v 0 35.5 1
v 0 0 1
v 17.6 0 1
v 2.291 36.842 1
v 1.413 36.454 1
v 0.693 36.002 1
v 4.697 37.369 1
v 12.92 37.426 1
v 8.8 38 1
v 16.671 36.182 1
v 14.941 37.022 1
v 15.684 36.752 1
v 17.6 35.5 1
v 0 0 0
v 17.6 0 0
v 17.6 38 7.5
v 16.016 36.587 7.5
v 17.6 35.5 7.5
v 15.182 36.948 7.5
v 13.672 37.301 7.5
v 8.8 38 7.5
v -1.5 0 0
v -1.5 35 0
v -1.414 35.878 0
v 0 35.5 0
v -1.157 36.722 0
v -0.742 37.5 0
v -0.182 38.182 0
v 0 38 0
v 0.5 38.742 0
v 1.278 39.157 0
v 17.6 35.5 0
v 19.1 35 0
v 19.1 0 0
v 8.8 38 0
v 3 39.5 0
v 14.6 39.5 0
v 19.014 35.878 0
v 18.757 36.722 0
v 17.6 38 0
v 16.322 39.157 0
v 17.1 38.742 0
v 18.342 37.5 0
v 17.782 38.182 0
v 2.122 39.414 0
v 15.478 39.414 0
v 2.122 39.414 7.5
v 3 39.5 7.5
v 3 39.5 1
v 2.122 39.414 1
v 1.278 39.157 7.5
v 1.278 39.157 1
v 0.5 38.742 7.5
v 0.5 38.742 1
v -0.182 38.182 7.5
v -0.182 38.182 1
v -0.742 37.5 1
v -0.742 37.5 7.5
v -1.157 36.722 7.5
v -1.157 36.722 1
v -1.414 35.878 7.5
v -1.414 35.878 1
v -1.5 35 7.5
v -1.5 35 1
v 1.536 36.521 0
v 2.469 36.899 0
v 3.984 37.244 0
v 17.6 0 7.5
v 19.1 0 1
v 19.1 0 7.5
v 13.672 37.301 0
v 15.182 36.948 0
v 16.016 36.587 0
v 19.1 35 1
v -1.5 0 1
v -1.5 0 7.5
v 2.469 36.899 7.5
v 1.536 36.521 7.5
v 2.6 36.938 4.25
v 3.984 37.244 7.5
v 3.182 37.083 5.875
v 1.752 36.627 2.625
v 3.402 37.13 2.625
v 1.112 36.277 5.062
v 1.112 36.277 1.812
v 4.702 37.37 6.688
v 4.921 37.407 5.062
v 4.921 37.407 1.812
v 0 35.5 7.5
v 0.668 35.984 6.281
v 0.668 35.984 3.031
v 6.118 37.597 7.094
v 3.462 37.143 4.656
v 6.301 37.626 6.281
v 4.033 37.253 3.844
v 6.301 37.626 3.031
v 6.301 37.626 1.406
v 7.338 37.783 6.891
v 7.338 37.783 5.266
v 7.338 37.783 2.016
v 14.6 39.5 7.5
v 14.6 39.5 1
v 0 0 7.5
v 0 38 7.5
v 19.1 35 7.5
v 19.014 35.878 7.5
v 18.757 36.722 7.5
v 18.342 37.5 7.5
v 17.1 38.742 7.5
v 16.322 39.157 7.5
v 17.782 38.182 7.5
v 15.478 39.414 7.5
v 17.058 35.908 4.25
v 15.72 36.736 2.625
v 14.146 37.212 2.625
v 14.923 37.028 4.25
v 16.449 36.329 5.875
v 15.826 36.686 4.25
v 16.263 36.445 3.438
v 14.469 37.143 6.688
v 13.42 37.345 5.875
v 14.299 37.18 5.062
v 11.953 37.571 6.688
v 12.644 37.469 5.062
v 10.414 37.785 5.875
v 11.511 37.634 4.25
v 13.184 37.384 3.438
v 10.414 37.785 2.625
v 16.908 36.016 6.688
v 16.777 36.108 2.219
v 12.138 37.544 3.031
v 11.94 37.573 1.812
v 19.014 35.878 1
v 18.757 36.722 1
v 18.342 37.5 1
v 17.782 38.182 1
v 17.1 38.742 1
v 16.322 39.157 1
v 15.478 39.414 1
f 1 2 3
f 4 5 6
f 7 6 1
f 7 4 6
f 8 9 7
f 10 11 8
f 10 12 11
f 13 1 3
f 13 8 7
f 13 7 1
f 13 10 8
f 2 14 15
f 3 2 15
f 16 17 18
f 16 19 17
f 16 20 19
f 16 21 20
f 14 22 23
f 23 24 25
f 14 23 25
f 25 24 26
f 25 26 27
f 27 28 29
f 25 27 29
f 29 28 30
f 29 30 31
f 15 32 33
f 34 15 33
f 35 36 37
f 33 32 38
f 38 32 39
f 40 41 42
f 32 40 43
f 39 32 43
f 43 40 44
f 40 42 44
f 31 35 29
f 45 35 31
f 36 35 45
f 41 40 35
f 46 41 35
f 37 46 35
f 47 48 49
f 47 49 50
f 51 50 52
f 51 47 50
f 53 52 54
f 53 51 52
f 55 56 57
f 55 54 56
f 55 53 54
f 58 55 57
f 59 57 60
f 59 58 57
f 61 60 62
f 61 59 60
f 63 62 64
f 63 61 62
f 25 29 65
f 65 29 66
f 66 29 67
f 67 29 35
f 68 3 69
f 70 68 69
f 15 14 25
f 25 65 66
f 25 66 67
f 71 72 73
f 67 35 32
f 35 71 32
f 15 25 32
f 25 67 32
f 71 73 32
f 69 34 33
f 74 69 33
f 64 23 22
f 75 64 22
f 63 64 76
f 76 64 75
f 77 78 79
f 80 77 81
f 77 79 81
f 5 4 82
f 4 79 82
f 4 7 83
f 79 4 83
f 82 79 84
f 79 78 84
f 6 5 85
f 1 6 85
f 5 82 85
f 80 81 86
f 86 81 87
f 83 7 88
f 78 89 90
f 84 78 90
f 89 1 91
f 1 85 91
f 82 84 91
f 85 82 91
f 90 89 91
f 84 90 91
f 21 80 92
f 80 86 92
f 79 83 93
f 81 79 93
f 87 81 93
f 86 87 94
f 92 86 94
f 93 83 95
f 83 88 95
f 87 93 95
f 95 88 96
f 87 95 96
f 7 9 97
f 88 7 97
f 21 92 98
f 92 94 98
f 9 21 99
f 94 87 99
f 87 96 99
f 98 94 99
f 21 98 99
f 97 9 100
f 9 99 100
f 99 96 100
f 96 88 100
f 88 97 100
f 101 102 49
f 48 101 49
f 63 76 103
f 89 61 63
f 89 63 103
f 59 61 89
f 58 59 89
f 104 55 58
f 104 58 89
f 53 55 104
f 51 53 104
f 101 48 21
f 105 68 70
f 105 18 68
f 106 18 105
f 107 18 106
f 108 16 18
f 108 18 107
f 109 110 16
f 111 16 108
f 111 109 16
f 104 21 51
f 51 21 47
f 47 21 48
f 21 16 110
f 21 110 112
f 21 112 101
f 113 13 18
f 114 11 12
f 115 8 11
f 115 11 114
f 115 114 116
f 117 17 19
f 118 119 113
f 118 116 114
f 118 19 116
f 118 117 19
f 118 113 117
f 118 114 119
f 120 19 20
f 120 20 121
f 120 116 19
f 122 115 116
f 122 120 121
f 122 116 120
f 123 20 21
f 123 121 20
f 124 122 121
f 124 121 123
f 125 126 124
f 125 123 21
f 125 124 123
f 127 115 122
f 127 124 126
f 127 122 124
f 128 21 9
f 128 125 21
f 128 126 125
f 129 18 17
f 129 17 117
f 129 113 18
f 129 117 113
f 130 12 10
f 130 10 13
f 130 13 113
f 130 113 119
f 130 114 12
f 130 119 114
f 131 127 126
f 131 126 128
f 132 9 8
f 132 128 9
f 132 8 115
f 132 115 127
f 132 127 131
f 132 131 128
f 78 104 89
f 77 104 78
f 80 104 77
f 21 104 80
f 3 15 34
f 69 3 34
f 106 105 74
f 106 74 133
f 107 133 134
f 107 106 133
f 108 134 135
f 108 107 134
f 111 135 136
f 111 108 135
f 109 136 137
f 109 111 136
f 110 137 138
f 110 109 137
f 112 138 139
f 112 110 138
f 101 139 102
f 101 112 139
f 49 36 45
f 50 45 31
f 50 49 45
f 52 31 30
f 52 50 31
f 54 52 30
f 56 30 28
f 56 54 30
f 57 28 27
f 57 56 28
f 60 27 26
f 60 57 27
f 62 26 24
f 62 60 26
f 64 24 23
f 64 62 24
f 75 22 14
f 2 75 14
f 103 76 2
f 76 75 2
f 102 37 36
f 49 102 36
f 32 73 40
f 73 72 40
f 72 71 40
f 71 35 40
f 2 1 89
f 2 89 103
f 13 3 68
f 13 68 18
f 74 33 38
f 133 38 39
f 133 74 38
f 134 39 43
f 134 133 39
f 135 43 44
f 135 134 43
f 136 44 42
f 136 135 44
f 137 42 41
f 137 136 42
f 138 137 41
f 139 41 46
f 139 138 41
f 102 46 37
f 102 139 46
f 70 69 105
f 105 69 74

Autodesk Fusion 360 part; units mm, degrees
sketch "Sketch1" plane through (0, 0, 0) normal (0, 0, 1) x (1, 0, 0)
  line L0 (0, 0) -> (17.6, 0)
  line L1 (17.6, 0) -> (17.6, 38)
  line L2 (17.6, 38) -> (0, 38)
  line L3 (0, 38) -> (0, 0)
  line L4 (-1.5, 0) -> (19.1, 0)
  line L5 (19.1, 0) -> (19.1, 39.5)
  line L6 (19.1, 39.5) -> (-1.5, 39.5)
  line L7 (-1.5, 39.5) -> (-1.5, 0)
  spline S0 degree 2 poles (0, 35.5) (2, 37) (8.8, 38) knots 0 0 0 0.926131 0.926131 0.926131 weights 1 3 1
  spline S1 degree 2 poles (17.6, 35.5) (15.497, 37.1201) (8.8, 38) knots 0 0 0 0.928188 0.928188 0.928188 weights 1 3 1
  dimension "d1" = 38
  dimension "d2" = 17.6
  dimension "d3" = 1.5
  dimension "d4" = 1.5
  dimension "d5" = 1.5
  dimension "d15" = 2.5
  dimension "d16" = 8.8
  dimension "d17" = 8.8
  dimension "d18" = 2.5
extrude "Extrude1" add sketch "Sketch1" along normal blind 1
extrude "Extrude2" add sketch "Sketch1" along normal blind 7.5 contours L1 L2 L3 L4 L5 L6 L7 | L2 L3 S0 | L1 L2 S1
fillet "Fillet1" radius 4.5 2 edges at (19.1, 39.5, 3.75) (-1.5, 39.5, 3.75)
